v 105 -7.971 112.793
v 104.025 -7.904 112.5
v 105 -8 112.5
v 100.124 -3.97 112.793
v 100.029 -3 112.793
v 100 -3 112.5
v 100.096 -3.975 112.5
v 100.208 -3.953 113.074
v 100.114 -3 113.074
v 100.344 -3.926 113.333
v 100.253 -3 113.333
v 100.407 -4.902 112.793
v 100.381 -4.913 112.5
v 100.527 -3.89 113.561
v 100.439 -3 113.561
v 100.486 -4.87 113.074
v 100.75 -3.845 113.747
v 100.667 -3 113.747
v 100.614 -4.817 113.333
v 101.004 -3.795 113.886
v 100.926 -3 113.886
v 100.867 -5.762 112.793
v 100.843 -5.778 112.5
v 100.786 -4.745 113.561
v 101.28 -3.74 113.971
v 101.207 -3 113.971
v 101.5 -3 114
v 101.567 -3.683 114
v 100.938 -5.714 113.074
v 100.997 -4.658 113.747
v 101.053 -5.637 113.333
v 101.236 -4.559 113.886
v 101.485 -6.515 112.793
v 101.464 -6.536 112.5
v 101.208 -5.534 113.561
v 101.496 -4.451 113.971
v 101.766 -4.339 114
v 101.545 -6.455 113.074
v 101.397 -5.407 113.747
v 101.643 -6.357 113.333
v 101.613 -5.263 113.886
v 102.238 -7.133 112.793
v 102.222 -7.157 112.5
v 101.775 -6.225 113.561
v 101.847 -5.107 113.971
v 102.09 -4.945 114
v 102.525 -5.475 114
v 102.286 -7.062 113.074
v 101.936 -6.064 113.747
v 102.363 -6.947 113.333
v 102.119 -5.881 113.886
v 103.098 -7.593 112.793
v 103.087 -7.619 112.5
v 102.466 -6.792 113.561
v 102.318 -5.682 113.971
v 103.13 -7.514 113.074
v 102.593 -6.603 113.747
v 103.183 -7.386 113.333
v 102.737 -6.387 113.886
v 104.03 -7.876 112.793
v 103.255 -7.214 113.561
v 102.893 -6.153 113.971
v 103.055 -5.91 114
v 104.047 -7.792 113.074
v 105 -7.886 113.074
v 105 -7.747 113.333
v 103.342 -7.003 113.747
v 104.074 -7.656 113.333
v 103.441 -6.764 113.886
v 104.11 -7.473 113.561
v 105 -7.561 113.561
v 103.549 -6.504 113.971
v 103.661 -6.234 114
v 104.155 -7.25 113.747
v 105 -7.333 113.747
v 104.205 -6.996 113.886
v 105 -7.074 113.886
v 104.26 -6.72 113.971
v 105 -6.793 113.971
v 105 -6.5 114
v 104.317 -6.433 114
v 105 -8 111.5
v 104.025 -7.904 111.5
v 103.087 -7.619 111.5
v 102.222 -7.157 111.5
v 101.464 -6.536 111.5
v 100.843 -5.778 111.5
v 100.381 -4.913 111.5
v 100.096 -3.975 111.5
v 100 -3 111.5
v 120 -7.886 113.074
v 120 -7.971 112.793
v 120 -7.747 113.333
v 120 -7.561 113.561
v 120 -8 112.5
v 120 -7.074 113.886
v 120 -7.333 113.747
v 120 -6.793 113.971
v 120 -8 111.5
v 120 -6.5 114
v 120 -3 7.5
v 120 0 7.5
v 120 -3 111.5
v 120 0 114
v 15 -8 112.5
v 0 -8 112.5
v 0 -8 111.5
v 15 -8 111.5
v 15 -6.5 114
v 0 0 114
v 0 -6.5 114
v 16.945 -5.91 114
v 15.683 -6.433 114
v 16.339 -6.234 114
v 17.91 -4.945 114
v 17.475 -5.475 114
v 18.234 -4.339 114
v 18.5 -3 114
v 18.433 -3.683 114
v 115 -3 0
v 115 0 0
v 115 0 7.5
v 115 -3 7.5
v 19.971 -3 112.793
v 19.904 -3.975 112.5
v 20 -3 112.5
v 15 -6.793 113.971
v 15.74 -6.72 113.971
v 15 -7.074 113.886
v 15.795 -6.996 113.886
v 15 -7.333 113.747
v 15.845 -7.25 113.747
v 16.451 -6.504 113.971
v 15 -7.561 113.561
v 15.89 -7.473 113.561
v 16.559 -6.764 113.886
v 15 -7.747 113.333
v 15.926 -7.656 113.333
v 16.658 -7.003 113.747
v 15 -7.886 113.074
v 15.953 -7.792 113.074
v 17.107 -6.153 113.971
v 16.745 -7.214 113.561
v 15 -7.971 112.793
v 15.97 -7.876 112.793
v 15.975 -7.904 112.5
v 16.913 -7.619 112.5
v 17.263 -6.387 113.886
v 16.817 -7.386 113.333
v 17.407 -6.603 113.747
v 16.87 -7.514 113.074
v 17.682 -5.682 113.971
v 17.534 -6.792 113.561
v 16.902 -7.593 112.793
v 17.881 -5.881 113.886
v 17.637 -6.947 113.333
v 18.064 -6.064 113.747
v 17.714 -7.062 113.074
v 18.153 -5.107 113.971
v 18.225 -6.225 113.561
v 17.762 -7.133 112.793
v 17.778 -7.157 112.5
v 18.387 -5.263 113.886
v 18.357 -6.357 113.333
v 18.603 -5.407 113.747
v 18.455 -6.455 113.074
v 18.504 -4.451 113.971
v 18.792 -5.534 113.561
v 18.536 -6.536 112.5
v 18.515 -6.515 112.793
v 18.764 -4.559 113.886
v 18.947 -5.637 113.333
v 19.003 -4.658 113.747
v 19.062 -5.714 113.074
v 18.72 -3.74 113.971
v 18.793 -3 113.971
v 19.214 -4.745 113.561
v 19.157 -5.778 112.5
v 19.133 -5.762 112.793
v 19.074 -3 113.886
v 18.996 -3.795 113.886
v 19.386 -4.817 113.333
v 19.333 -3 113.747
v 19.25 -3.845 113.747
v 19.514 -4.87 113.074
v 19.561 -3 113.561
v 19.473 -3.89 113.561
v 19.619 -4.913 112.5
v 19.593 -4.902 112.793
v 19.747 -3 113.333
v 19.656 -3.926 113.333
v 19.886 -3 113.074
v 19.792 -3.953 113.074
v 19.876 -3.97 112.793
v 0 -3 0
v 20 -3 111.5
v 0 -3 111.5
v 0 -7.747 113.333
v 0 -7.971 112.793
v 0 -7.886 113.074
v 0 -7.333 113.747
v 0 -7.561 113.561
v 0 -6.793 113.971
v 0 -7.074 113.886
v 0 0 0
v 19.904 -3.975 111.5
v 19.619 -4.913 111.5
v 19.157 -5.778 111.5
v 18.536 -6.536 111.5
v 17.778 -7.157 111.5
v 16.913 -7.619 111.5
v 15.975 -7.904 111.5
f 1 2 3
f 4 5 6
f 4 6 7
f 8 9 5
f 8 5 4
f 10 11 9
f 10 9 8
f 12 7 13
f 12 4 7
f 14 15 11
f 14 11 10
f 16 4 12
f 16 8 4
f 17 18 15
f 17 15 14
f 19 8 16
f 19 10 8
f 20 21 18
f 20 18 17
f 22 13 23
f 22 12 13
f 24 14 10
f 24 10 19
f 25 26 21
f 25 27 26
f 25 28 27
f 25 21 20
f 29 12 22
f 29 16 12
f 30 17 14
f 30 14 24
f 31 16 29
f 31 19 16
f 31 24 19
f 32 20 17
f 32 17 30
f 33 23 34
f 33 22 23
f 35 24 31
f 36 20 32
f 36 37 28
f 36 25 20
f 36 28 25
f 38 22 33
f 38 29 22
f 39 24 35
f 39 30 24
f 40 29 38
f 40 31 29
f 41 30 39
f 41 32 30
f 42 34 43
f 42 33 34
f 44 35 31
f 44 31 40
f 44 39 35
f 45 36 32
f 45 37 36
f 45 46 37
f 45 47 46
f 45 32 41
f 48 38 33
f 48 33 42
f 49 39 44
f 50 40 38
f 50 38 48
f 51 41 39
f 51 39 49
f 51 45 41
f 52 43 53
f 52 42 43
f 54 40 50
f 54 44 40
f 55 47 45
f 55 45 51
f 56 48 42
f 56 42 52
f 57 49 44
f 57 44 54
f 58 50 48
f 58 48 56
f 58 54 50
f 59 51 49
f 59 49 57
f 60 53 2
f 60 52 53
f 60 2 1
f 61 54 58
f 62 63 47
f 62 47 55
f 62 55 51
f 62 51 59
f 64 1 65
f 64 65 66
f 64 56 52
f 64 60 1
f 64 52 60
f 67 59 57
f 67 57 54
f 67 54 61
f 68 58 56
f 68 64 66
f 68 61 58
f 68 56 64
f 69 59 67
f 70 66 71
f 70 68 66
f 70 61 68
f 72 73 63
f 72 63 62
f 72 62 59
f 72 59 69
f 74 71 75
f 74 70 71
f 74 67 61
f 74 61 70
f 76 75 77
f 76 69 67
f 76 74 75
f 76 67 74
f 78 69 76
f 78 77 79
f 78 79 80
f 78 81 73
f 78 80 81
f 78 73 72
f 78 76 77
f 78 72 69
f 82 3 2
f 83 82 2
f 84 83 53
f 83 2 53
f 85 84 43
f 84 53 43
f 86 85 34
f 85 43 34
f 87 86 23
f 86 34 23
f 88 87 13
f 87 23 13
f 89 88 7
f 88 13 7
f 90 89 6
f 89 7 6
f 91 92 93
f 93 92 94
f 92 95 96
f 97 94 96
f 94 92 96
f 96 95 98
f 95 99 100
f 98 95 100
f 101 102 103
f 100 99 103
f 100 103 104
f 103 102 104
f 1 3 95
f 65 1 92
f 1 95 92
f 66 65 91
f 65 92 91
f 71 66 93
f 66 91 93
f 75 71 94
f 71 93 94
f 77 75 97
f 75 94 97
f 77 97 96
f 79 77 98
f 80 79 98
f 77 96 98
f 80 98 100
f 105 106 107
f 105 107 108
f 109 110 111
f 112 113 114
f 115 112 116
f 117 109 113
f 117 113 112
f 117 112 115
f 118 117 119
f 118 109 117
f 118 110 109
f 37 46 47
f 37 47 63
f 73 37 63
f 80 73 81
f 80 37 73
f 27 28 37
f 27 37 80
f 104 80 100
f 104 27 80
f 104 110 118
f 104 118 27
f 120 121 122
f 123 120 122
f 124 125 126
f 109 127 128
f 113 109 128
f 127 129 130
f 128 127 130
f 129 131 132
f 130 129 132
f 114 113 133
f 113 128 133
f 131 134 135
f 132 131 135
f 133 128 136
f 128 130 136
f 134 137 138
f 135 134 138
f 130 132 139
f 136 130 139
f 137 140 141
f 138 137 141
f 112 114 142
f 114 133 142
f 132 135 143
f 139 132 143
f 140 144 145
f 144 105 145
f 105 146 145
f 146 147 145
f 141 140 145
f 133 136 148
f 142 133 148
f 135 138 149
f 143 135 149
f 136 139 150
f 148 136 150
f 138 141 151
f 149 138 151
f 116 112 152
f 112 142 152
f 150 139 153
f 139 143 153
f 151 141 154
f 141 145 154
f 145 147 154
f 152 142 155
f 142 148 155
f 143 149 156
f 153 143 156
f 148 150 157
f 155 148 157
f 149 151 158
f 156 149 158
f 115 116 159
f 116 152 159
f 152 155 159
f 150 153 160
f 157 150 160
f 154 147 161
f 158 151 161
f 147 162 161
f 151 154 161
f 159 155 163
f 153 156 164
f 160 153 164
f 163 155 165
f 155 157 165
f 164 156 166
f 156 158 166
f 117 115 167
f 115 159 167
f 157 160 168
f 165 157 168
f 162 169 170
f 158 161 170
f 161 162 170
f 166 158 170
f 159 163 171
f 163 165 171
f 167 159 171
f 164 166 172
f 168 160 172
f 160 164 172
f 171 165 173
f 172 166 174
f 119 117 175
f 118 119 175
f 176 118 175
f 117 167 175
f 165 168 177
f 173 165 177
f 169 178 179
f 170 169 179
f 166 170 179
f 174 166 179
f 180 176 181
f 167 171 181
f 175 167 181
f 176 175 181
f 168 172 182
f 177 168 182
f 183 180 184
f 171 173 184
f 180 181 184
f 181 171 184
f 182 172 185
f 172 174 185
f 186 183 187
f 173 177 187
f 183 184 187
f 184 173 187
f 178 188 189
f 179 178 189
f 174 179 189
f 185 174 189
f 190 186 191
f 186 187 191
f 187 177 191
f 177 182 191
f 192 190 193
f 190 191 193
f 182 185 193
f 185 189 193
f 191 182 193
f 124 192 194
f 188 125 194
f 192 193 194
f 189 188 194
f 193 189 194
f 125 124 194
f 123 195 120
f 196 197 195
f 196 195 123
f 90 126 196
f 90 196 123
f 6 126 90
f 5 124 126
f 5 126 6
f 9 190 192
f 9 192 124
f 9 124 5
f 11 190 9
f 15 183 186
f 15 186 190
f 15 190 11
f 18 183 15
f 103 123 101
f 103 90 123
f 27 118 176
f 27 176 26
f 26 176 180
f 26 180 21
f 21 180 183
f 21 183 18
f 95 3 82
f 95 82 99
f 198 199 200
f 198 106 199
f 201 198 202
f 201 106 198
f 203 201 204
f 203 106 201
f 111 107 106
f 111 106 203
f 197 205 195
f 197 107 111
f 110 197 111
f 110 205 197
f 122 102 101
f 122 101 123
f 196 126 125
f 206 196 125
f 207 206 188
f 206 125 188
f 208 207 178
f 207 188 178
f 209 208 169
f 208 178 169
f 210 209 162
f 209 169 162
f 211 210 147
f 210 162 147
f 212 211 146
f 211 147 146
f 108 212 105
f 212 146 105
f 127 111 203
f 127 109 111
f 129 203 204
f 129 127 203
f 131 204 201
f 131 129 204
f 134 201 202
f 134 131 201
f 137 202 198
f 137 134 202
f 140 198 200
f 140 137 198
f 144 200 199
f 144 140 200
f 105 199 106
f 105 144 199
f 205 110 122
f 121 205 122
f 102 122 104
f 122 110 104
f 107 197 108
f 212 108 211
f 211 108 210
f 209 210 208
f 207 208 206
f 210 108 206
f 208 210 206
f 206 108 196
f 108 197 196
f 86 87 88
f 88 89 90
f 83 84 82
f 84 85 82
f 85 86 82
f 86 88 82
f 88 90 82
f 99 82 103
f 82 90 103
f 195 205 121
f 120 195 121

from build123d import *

# Parameters (mm, degrees)
F0_W     = 120
F0_H     = 114
F1_DEPTH = 3
F2_W     = 20
F2_H     = 2.5
F3_DEPTH = 5
F4_R     = 4.99999
F5_R     = 1.5
F6_W     = 5
F6_H     = 7.5
F7_DEPTH = 25


# Not quite as in the source:
# - a fillet or chamfer is up to 0.001 mm smaller than in the source, because OpenCascade refuses the exact size


with BuildPart() as f1:
    # F0 (on Front) → F1 (new body)
    with BuildSketch(Plane.XZ):
        with Locations((60, 57)):
            Rectangle(F0_W, F0_H)
    extrude(amount=F1_DEPTH)

    # F2 (on face) → F3 (join)
    with BuildSketch(Plane.XZ.offset(3)):
        with Locations((10, 112.75)):
            Rectangle(F2_W, F2_H)
        with Locations((110, 112.75)):
            Rectangle(F2_W, F2_H)
    extrude(amount=F3_DEPTH)

    # F4 (radius 5 in the source; OpenCascade refuses exactly that, so slightly less here)
    f4_edges = [f1.edges().sort_by_distance(p)[0] for p in [
        (20, -8, 112.75),
        (100, -8, 112.75),
    ]]
    fillet(f4_edges, radius=F4_R)

    # F5
    f5_edges = [f1.edges().sort_by_distance(p)[0] for p in [
        (7.500005, -8, 114),
        (112.499995, -8, 114),
    ]]
    fillet(f5_edges, radius=F5_R)

    # F6 (on face) → F7 (cut)
    with BuildSketch(Plane(origin=(0, 0, 0), x_dir=(-1, 0, 0), z_dir=(0, 1, 0))):
        with Locations((-117.5, 3.75)):
            Rectangle(F6_W, F6_H)
    extrude(amount=-F7_DEPTH, mode=Mode.SUBTRACT)


solid = f1.part
